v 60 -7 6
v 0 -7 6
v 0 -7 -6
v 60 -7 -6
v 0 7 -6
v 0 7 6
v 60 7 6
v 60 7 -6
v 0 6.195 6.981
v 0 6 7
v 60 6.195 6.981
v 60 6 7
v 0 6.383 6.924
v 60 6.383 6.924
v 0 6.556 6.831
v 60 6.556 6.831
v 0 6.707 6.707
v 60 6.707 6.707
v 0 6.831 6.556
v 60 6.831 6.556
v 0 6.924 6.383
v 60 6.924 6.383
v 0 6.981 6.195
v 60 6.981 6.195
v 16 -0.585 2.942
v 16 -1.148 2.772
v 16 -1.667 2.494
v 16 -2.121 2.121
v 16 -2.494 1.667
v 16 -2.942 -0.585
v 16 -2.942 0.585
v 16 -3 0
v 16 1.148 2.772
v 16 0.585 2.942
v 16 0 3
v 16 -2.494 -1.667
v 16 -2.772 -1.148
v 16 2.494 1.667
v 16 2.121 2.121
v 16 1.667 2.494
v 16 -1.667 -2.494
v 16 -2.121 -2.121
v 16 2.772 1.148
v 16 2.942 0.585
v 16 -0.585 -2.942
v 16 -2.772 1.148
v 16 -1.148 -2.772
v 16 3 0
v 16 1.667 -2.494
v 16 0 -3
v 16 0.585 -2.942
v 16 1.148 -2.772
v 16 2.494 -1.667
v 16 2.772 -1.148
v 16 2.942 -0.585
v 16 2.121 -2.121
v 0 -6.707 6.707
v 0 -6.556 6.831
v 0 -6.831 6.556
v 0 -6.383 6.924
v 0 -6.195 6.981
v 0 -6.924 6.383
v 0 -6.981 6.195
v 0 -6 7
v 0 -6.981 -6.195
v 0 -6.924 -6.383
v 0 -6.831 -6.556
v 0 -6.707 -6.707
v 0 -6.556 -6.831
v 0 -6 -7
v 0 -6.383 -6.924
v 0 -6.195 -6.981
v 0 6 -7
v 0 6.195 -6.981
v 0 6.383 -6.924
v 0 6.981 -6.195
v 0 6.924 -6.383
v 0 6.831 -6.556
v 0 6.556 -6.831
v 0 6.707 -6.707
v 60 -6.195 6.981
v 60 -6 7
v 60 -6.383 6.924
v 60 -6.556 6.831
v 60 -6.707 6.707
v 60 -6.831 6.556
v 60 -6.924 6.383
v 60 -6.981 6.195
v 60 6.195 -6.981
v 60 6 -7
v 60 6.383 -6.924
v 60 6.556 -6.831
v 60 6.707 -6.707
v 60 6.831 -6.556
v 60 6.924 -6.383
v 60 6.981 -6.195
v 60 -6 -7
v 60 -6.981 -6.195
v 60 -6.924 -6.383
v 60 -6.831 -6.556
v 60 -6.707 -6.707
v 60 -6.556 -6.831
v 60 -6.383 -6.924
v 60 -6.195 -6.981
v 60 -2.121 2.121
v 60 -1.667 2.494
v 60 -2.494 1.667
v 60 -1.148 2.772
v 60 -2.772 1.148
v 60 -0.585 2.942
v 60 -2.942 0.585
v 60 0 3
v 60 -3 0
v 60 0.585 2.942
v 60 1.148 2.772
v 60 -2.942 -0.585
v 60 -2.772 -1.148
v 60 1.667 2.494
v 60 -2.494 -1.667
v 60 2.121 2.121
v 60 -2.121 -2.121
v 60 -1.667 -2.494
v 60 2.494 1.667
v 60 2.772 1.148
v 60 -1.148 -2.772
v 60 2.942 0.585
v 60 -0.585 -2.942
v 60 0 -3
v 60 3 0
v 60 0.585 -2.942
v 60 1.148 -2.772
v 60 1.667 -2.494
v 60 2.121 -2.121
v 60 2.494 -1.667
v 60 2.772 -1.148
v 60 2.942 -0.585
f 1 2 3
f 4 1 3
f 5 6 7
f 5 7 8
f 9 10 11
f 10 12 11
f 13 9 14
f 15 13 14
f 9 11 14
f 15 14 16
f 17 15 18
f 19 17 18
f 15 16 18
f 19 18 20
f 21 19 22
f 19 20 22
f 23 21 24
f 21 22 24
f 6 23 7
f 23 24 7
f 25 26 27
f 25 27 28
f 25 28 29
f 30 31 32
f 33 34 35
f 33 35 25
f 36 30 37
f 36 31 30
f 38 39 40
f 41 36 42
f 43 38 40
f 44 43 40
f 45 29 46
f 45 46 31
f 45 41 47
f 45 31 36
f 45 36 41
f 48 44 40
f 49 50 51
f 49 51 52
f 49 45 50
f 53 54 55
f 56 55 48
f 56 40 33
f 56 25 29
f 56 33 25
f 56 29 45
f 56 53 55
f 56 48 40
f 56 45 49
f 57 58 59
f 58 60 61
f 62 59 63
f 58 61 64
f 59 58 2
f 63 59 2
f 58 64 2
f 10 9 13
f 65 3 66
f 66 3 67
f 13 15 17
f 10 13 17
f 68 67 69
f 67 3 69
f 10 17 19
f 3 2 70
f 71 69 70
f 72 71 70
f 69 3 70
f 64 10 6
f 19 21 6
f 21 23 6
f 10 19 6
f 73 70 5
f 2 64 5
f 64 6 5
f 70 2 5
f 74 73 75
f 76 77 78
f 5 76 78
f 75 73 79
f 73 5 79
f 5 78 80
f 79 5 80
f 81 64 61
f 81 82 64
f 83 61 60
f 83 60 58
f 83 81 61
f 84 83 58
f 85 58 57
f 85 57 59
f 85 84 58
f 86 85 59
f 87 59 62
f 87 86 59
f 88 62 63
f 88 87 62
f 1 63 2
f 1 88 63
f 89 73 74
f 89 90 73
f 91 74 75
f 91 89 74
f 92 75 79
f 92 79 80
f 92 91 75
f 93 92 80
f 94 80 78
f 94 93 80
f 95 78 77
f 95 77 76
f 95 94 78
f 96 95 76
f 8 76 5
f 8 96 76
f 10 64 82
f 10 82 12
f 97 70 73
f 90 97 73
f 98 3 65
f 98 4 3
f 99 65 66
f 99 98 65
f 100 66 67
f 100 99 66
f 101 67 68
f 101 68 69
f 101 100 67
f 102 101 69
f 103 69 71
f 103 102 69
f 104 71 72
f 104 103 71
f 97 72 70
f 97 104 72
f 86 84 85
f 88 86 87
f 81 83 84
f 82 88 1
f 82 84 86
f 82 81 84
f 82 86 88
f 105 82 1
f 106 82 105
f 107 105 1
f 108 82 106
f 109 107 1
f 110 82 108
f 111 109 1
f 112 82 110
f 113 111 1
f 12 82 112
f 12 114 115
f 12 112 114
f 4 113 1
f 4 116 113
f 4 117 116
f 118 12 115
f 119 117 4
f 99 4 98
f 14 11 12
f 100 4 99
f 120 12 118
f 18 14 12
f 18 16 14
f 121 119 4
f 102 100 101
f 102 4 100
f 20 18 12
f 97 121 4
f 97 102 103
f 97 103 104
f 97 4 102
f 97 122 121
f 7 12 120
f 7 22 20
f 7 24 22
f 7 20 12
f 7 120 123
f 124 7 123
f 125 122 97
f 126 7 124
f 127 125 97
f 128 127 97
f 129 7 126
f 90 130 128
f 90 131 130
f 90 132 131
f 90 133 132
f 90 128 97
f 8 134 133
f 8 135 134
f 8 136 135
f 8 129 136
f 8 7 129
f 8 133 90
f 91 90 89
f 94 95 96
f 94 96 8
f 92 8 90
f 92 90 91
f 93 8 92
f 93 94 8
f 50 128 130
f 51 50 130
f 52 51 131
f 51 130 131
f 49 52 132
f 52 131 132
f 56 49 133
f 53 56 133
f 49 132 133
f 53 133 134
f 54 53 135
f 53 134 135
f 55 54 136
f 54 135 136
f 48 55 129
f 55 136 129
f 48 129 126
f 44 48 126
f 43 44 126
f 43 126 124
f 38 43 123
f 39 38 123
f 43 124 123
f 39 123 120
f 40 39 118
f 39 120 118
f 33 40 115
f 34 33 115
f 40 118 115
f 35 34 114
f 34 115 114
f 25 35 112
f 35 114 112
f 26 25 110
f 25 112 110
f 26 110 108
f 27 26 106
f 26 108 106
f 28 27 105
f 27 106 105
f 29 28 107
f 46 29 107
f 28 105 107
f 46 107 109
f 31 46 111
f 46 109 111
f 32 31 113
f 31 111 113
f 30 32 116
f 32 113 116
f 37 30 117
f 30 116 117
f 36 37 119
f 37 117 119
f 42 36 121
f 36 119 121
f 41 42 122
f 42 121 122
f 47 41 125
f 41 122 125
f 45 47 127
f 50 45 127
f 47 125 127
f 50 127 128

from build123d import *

# Parameters (mm, degrees)
SKETCH1_W           = 14
SKETCH1_H           = 14
BOSS_EXTRUDE1_DEPTH = 60
FILLET1_R           = 1
SKETCH2_R           = 3
CUT_EXTRUDE1_DEPTH  = 44


with BuildPart() as part:
    # Sketch1 → Boss-Extrude1 (new body)
    with BuildSketch(Plane(origin=(0, 0, 0), x_dir=(0, 0, -1), z_dir=(1, 0, 0))):
        Rectangle(SKETCH1_W, SKETCH1_H)
    extrude(amount=BOSS_EXTRUDE1_DEPTH)

    # Fillet1
    fillet1_edges = [part.edges().sort_by_distance(p)[0] for p in [
        (30, -7, -7),
        (30, -7, 7),
        (30, 7, 7),
        (30, 7, -7),
    ]]
    fillet(fillet1_edges, radius=FILLET1_R)

    # Sketch2 → Cut-Extrude1 (cut)
    with BuildSketch(Plane(origin=(60, 0, 0), x_dir=(0, 0, -1), z_dir=(1, 0, 0))):
        Circle(SKETCH2_R)
    extrude(amount=-CUT_EXTRUDE1_DEPTH, mode=Mode.SUBTRACT)


solid = part.part
